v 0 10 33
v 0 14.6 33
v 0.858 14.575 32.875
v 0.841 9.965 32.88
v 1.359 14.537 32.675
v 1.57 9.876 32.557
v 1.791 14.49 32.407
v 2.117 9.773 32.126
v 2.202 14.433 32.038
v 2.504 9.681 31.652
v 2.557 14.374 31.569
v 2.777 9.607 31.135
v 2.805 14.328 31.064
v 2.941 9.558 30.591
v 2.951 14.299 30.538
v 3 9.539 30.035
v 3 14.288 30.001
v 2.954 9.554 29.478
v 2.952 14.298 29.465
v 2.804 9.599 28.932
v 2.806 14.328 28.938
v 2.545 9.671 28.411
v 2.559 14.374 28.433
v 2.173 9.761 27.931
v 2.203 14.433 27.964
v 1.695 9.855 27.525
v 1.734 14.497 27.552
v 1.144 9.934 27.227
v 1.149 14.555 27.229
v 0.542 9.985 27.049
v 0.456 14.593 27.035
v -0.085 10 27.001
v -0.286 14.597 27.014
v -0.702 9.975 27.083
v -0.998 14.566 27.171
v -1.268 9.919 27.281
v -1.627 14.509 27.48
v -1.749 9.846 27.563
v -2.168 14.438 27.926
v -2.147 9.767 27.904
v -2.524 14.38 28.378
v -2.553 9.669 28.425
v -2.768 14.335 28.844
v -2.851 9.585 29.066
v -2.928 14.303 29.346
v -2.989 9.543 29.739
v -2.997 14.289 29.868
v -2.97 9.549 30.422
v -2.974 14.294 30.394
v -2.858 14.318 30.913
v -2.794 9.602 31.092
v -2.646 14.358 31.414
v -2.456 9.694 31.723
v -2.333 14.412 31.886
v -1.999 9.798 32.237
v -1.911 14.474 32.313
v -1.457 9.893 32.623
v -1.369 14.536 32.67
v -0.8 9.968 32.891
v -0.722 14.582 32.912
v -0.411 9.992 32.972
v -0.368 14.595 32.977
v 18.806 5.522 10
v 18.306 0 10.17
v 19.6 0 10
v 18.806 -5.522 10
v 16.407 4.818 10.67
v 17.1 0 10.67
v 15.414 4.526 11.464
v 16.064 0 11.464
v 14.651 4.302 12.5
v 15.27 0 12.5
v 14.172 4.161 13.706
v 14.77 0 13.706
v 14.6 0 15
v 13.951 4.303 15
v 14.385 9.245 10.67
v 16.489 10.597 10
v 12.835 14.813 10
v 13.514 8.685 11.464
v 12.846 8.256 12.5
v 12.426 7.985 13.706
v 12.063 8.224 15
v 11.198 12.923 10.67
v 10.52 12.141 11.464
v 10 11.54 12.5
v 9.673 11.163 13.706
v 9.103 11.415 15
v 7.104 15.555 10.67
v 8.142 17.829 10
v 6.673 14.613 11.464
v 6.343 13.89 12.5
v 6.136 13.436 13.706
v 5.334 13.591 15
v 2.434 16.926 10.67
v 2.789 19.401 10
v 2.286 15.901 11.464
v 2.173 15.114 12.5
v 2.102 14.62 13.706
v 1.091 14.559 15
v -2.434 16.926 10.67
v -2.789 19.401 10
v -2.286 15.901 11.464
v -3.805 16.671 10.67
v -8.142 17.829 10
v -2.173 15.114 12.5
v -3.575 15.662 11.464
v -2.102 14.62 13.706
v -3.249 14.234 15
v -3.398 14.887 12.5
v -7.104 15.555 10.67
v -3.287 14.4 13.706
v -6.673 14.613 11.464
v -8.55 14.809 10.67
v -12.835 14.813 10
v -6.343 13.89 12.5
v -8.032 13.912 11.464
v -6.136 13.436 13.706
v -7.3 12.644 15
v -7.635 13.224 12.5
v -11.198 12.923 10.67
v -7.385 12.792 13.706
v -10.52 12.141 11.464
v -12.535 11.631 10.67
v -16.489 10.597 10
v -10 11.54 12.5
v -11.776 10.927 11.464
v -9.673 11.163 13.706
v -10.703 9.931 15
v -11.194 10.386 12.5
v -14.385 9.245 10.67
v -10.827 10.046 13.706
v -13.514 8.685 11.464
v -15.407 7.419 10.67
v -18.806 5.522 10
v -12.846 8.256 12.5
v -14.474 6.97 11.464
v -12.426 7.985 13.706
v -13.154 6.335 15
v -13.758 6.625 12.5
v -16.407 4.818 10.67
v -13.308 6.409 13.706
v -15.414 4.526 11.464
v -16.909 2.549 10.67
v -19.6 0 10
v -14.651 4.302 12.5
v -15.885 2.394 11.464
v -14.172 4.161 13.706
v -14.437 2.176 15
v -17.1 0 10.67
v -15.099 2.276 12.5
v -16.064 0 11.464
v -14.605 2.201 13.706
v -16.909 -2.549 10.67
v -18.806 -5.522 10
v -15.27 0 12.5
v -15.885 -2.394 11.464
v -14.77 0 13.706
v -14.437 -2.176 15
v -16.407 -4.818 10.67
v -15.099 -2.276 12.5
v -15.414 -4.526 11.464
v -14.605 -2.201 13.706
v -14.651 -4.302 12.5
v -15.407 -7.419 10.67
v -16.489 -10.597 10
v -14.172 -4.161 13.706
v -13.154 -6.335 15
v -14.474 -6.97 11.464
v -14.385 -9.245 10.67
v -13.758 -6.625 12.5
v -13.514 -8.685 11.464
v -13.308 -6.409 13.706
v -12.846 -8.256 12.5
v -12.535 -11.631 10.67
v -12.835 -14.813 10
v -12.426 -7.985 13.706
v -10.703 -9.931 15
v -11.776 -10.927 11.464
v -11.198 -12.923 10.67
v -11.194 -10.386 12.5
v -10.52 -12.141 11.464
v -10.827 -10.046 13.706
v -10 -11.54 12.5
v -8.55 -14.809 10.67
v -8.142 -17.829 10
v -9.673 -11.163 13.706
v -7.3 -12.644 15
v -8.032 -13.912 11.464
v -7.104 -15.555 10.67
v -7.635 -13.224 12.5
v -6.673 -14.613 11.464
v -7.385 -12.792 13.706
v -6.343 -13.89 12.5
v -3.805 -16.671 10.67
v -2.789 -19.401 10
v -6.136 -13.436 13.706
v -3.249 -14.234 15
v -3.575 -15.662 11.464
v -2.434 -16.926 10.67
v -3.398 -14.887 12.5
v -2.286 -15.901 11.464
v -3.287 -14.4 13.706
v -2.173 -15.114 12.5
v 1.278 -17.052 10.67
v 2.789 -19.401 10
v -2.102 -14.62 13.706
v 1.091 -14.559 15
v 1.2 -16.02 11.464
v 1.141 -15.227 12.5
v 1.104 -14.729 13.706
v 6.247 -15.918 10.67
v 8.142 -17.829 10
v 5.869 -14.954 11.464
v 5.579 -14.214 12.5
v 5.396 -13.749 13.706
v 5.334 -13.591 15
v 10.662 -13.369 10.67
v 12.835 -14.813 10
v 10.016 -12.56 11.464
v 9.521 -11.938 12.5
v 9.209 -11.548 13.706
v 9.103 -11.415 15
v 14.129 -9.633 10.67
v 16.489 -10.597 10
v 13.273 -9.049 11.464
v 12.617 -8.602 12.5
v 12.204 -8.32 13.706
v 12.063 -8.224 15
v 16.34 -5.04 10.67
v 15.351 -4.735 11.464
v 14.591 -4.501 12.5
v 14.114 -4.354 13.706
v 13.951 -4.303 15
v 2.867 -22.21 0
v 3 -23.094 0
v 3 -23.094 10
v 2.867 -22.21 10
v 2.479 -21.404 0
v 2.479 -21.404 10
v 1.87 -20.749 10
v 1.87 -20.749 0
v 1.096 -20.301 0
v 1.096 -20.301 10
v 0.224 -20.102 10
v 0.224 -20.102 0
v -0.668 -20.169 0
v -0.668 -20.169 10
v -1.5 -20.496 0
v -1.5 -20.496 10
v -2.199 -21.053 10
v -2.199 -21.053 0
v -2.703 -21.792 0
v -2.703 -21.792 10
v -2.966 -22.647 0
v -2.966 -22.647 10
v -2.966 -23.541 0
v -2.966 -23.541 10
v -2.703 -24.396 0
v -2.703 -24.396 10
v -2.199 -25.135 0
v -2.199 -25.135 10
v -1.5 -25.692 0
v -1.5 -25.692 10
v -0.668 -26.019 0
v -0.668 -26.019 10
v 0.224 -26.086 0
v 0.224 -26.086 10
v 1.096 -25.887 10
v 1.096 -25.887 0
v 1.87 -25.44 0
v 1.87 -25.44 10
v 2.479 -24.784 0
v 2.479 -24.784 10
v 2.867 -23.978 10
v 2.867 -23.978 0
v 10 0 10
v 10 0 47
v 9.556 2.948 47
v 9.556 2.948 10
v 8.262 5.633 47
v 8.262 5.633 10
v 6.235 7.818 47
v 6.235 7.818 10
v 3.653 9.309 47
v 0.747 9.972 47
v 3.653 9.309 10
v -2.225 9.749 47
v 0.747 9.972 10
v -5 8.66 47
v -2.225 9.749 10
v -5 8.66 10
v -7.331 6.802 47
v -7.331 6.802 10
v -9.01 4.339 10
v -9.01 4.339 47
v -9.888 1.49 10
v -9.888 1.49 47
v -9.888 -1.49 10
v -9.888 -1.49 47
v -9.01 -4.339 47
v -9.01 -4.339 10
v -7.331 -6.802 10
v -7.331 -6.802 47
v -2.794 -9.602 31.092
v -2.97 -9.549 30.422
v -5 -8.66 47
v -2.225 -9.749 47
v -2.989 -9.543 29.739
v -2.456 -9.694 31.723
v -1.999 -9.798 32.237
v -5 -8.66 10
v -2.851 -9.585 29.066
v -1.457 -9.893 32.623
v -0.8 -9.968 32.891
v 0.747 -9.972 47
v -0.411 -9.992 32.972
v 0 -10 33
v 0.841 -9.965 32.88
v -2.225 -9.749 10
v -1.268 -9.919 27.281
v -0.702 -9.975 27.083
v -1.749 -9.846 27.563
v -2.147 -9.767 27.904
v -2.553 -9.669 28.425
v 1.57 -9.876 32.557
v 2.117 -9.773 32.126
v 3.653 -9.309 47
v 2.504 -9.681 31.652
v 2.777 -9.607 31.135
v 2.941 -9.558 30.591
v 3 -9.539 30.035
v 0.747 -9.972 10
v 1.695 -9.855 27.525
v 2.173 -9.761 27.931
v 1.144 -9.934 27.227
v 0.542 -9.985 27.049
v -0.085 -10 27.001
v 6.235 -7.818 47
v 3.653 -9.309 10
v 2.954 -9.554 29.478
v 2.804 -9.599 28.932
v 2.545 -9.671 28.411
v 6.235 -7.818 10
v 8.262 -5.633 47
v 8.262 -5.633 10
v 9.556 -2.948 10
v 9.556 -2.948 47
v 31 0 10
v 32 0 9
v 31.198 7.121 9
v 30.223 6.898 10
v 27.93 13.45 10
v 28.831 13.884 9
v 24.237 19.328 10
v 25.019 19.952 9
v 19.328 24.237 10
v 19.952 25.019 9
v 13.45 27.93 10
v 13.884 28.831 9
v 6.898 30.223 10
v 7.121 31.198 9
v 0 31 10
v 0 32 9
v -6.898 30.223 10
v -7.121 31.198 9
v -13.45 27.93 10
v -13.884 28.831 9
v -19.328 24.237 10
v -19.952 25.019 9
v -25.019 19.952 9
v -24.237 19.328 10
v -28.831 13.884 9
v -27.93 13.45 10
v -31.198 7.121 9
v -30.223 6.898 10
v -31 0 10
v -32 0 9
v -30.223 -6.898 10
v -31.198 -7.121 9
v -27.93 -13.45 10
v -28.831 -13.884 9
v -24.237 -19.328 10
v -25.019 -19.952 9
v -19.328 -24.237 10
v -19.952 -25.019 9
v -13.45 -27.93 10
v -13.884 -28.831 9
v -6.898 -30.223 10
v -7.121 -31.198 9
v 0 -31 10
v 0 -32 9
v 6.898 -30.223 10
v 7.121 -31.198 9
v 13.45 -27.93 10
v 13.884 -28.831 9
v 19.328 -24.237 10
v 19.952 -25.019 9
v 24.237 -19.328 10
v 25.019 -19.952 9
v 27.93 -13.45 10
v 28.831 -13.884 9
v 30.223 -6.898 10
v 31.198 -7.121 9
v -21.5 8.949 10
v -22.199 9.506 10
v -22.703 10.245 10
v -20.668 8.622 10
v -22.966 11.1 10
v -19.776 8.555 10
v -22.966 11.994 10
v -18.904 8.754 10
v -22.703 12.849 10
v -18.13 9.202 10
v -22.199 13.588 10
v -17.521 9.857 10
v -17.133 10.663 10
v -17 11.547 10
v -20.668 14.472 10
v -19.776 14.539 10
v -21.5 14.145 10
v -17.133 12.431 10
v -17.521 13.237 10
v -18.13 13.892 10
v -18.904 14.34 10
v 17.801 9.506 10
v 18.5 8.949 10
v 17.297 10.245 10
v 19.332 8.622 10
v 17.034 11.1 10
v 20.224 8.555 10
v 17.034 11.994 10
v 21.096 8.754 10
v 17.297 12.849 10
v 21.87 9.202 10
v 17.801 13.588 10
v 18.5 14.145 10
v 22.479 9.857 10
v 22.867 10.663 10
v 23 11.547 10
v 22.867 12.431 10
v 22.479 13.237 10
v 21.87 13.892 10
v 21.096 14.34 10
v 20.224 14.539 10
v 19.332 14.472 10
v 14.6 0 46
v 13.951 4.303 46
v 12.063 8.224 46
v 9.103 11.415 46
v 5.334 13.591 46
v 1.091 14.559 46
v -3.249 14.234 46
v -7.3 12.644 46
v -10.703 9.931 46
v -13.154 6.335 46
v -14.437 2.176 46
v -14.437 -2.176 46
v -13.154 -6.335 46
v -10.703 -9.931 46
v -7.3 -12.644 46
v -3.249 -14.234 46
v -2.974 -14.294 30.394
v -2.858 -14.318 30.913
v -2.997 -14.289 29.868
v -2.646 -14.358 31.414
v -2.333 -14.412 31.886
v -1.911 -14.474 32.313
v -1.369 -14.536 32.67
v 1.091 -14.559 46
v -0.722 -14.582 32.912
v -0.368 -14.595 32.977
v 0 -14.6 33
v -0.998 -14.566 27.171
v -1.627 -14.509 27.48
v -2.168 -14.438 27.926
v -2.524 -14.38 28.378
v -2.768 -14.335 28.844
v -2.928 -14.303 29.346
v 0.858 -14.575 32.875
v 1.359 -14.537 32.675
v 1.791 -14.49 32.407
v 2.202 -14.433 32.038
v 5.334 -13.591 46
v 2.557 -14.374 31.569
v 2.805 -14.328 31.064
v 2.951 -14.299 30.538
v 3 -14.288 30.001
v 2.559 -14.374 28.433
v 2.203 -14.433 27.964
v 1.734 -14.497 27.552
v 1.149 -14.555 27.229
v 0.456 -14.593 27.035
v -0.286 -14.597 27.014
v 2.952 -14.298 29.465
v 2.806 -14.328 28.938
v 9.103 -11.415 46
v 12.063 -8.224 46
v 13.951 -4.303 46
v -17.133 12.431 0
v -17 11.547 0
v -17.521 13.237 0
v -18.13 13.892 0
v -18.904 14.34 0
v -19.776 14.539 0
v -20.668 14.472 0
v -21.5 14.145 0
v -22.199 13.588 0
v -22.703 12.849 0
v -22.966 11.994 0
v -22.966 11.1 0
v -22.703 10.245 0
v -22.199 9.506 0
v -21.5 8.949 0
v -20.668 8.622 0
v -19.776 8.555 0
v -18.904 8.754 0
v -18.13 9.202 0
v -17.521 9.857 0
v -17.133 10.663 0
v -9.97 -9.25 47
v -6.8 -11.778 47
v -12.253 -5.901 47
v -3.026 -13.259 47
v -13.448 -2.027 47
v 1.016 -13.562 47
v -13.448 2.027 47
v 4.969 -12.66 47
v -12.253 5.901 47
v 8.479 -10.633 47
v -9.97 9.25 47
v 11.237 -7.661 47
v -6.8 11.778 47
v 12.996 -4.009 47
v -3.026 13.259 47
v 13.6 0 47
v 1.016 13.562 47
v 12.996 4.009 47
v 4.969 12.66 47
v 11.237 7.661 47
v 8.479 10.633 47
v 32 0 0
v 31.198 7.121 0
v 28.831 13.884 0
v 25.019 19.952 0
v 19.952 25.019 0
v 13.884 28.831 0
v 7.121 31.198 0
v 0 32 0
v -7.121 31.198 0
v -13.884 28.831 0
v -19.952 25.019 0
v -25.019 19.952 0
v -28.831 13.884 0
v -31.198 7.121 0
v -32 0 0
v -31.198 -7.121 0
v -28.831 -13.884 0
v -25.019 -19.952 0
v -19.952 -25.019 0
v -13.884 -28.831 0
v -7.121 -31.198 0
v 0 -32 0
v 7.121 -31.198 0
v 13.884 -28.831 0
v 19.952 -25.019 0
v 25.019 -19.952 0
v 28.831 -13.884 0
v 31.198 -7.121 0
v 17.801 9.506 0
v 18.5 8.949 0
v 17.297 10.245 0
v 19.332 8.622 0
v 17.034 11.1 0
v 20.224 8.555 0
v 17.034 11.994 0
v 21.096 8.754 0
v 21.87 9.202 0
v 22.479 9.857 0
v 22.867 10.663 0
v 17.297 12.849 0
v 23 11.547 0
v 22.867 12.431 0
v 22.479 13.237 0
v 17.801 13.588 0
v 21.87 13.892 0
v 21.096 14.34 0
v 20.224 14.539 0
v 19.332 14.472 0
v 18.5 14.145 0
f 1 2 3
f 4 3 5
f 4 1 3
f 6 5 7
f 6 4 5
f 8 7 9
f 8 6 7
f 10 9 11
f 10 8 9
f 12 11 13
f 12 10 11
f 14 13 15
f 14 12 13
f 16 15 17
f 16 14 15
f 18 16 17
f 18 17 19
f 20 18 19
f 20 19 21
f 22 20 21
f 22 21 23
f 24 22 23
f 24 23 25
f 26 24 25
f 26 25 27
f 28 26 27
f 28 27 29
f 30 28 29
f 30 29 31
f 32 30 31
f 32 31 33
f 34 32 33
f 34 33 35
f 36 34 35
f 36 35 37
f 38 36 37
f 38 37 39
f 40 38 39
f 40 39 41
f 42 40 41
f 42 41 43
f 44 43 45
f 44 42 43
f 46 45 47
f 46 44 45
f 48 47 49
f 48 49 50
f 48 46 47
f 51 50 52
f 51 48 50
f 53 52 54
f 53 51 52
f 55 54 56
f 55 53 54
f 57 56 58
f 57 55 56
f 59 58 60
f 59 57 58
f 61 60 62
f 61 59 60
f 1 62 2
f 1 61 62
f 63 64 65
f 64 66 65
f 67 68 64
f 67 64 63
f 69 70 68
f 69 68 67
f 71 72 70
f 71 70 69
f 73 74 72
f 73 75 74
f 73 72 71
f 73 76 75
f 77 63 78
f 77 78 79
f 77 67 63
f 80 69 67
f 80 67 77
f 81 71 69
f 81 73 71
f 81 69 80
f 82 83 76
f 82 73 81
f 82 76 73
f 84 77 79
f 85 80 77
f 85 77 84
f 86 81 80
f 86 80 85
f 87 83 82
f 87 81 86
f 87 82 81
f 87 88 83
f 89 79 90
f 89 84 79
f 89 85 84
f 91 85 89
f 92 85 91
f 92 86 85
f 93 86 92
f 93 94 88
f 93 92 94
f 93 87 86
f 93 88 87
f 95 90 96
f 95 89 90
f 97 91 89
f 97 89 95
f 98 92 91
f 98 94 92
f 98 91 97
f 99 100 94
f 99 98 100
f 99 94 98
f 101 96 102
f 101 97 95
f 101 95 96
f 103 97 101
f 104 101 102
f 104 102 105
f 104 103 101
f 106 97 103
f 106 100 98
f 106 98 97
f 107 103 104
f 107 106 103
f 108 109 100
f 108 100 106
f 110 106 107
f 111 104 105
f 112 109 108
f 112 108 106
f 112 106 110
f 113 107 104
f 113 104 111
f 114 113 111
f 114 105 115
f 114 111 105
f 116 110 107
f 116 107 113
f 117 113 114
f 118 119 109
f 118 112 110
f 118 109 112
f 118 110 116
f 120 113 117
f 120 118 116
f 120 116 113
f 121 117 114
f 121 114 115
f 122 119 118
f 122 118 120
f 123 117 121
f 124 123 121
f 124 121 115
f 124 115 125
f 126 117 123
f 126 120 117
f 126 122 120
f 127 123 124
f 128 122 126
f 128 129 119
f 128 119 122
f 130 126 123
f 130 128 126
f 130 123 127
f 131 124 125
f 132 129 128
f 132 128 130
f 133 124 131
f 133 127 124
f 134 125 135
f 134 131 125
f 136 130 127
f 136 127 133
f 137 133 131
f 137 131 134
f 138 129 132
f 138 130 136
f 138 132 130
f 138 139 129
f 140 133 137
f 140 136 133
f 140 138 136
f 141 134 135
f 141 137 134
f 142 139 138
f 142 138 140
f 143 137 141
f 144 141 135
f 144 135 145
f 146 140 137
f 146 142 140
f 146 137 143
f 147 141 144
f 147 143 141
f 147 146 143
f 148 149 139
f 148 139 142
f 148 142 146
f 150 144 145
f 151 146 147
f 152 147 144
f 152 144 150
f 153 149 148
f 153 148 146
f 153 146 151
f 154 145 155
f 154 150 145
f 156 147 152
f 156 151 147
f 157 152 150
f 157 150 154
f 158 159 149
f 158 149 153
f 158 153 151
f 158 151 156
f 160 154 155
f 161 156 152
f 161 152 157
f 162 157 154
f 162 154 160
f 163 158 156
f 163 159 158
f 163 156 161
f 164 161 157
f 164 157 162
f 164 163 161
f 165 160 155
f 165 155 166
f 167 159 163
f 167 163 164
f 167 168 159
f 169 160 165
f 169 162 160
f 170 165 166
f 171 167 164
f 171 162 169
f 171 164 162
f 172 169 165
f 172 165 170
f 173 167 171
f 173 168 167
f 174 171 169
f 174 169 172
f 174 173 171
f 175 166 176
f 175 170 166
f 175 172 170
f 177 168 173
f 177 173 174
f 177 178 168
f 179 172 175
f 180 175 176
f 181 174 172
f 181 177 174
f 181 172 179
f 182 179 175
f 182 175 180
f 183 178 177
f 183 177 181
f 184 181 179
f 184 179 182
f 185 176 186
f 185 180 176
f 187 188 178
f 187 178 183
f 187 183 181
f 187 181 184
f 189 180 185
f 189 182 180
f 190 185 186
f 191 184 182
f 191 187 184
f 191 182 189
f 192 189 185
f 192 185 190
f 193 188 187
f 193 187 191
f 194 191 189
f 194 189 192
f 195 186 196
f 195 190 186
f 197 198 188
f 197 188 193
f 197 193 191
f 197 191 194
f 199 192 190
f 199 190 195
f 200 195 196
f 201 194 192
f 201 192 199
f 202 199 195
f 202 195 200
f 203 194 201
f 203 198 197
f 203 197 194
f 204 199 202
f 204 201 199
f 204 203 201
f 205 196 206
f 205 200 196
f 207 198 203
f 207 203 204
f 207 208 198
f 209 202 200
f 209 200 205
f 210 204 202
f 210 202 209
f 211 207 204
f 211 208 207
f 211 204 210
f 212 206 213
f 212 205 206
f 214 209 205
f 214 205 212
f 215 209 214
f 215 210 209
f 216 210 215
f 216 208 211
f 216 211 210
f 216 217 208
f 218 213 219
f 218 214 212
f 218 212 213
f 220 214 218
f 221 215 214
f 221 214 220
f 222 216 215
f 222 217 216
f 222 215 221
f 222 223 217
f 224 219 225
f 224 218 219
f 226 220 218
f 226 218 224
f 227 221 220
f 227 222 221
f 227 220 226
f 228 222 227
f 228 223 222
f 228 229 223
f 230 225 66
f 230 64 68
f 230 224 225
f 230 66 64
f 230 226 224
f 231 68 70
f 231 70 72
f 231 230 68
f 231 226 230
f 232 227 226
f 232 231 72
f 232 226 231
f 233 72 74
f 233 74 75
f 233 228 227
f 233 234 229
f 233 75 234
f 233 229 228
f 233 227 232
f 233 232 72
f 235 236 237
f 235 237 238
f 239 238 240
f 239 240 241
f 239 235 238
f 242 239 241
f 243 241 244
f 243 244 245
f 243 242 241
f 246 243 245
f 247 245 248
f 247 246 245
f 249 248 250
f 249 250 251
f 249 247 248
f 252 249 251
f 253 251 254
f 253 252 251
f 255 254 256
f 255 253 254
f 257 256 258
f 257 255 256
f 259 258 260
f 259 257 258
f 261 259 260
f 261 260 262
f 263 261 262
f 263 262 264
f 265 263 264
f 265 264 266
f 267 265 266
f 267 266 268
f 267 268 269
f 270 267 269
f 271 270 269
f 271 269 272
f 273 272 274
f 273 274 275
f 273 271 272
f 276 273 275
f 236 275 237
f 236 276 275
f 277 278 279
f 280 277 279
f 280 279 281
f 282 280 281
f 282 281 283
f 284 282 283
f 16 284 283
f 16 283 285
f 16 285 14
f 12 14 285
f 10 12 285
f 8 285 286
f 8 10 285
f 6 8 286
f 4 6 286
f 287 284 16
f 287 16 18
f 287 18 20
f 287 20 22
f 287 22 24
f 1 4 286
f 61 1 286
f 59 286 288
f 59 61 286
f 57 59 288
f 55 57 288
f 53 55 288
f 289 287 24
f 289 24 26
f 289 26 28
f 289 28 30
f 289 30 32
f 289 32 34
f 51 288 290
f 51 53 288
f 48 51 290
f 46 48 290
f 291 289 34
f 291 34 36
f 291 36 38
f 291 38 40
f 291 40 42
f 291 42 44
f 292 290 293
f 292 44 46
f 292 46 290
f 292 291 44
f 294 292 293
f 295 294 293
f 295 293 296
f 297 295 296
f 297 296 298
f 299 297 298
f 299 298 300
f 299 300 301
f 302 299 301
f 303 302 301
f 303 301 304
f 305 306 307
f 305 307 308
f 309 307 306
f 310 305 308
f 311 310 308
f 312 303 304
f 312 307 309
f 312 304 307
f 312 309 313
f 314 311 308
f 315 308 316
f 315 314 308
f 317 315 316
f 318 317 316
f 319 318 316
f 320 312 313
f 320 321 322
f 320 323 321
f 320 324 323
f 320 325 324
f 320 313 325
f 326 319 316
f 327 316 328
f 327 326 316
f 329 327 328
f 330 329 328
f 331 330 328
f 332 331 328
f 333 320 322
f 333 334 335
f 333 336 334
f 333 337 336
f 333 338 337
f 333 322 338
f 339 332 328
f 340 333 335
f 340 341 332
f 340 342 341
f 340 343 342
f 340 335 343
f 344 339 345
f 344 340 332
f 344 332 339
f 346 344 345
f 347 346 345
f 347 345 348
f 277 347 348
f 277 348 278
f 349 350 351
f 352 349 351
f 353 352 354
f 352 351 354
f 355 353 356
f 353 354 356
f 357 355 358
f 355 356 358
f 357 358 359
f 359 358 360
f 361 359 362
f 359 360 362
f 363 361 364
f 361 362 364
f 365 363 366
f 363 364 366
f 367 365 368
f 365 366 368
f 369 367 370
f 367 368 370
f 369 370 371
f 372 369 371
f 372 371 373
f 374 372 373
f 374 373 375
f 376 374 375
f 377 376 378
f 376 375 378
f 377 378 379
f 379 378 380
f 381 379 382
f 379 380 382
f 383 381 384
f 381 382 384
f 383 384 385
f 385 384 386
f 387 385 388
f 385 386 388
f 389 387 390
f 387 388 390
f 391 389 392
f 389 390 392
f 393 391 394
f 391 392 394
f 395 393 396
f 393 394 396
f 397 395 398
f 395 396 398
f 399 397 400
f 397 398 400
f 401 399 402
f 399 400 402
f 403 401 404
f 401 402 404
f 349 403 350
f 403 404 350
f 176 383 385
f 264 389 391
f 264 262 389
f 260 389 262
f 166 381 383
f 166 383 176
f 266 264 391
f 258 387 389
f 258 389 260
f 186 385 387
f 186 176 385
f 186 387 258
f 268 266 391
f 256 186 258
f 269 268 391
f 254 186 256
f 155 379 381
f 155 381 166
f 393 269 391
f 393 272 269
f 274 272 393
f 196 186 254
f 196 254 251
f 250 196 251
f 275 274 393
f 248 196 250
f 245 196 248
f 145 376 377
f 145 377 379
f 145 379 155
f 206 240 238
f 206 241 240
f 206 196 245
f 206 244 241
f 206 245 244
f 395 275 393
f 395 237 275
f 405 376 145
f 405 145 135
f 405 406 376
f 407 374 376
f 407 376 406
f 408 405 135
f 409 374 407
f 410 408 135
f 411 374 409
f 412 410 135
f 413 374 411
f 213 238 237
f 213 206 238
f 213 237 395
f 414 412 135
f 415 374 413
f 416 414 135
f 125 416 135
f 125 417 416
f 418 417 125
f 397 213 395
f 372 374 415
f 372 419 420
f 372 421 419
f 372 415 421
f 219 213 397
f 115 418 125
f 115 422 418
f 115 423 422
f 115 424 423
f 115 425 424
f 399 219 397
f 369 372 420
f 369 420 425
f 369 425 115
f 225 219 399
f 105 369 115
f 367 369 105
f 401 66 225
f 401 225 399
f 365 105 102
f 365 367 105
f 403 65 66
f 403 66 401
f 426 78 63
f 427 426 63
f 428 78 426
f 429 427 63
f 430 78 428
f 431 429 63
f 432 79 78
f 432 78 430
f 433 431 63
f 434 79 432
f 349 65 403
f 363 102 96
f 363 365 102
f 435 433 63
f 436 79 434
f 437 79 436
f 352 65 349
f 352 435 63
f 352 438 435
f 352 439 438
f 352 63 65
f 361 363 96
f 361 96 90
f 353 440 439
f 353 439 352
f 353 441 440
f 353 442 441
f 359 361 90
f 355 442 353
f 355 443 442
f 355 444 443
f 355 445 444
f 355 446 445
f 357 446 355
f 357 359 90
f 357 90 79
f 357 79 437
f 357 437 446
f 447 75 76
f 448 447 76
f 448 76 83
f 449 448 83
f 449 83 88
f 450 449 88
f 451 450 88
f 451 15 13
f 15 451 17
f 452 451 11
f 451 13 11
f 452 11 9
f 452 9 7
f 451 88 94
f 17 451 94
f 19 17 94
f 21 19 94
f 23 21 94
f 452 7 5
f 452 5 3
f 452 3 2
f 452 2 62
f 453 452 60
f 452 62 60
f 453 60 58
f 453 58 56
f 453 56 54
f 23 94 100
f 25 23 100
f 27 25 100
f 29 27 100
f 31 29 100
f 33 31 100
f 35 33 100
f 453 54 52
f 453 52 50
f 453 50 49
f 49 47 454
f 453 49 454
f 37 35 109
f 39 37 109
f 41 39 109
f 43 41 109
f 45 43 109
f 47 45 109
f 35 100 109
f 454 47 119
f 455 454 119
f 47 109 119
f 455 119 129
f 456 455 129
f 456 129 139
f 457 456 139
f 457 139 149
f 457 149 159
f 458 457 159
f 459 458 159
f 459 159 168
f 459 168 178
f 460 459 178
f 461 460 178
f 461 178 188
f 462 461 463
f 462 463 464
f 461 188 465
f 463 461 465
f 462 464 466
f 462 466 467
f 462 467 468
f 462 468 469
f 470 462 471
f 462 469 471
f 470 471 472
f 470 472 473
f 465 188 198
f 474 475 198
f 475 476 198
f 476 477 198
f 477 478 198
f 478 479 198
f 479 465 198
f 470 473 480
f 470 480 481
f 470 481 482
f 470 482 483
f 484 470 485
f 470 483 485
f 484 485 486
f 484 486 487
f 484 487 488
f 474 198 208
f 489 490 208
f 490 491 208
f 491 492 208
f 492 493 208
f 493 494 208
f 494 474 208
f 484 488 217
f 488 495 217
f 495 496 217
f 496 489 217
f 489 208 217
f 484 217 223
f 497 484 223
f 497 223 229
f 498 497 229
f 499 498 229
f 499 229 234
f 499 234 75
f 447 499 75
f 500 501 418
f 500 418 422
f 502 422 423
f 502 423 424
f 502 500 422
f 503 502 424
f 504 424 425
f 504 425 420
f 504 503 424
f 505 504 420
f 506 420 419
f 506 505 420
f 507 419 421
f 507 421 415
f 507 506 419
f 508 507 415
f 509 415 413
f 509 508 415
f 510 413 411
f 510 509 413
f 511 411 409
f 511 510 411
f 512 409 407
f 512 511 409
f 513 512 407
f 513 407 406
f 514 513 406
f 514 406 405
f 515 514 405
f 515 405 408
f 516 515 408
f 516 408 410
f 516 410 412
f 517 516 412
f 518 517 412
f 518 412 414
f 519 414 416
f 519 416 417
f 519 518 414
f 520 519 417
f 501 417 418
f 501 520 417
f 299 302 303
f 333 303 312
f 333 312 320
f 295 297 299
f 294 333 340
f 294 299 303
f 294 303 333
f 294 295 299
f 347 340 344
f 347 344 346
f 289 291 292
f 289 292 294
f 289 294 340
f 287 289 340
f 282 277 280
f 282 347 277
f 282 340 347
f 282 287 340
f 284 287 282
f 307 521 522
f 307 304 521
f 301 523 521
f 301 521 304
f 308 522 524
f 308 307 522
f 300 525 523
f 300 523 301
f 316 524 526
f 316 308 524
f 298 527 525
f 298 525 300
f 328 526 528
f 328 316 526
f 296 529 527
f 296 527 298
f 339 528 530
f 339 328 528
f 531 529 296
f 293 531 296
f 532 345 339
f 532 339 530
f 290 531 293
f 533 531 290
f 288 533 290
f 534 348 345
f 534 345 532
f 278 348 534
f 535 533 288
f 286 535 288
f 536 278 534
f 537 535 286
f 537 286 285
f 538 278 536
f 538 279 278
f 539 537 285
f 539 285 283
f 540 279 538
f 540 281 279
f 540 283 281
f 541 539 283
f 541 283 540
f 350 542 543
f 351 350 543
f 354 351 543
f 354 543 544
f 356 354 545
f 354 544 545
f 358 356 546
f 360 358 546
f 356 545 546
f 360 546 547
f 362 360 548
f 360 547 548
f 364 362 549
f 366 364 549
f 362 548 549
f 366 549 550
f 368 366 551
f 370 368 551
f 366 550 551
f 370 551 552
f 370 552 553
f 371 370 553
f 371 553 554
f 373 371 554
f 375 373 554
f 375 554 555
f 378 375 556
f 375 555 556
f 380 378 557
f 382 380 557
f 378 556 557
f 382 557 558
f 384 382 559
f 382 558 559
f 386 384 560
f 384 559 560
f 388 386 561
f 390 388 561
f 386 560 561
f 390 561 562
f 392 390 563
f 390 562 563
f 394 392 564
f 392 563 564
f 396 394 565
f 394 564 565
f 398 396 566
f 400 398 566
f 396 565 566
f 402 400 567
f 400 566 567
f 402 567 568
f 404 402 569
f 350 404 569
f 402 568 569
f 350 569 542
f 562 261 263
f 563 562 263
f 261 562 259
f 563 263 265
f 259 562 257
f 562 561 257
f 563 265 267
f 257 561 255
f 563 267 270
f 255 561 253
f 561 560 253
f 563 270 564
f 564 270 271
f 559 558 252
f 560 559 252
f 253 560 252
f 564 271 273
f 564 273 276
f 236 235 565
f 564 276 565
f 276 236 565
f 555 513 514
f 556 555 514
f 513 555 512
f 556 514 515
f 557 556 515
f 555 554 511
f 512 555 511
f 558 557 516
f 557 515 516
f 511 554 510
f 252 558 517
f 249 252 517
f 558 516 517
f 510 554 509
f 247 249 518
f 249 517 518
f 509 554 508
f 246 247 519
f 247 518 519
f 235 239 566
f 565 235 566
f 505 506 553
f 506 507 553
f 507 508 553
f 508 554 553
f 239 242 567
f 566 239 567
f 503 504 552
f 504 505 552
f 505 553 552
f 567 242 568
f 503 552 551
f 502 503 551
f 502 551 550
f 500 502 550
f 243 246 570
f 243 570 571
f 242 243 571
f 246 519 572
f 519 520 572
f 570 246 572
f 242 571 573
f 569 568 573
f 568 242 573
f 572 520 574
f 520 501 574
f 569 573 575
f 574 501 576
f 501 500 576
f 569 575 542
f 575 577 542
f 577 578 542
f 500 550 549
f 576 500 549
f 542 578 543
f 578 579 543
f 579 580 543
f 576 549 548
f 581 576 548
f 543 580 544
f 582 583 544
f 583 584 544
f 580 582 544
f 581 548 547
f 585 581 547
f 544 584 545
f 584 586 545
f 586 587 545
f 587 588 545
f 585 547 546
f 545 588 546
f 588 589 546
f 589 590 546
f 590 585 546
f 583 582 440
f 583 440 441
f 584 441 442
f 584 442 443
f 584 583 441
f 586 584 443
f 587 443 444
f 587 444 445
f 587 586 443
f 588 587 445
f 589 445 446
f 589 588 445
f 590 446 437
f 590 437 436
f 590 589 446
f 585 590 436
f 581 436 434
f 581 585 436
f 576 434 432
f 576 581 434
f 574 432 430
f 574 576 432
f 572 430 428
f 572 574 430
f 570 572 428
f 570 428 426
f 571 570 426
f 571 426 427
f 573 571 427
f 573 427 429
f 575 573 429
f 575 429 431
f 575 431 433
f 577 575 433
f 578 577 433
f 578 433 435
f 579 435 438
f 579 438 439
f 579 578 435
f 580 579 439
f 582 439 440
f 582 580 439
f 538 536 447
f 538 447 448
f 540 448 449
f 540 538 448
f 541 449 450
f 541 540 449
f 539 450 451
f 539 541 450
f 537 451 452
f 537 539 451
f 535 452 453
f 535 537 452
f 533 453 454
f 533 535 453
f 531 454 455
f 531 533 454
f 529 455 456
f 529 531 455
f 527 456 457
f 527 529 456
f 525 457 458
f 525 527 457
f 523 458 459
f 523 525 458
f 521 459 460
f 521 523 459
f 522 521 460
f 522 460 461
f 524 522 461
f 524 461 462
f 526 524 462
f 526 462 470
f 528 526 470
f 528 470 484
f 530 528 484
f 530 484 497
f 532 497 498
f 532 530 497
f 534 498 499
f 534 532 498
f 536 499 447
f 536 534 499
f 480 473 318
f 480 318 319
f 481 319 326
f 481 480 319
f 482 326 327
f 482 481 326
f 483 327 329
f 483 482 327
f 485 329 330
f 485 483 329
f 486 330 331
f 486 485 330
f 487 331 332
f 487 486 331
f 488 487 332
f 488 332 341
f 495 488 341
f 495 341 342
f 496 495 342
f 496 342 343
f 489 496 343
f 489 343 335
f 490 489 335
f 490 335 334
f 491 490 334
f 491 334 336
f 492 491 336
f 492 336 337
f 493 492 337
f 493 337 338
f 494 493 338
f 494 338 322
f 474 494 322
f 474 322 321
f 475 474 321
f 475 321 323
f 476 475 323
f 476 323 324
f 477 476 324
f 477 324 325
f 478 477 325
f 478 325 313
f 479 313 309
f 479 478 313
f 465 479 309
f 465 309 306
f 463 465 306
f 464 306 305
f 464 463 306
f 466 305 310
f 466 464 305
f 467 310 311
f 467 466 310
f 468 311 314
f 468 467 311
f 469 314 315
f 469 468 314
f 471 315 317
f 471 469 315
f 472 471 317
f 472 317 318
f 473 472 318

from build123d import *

# Parameters (mm, degrees)
SKETCH1_R               = 32
SKETCH1_R_2             = 3
BOSS_EXTRUDE1_DEPTH     = 10
SKETCH2_R               = 14.6
SKETCH2_R_2             = 10
BOSS_EXTRUDE2_DEPTH     = 37
CUT_EXTRUDE1_DEPTH      = 66.245689513
CUT_EXTRUDE1_DEPTH_BACK = 66.245689513
SKETCH3_R               = 3
FILLET_1_R              = 5
CHAMFER_1_SIZE          = 1


with BuildPart() as part:
    # Sketch1 → Boss-Extrude1 (new body)
    with BuildSketch(Plane.XY):
        Circle(SKETCH1_R)
        with Locations((20, 11.547005384)):
            Circle(SKETCH1_R_2, mode=Mode.SUBTRACT)
        with Locations((0, -23.094010768)):
            Circle(SKETCH1_R_2, mode=Mode.SUBTRACT)
        with Locations((-20, 11.547005384)):
            Circle(SKETCH1_R_2, mode=Mode.SUBTRACT)
    extrude(amount=BOSS_EXTRUDE1_DEPTH)

    # Sketch2 → Boss-Extrude2 (add)
    with BuildSketch(Plane.XY.offset(10)):
        Circle(SKETCH2_R)
        Circle(SKETCH2_R_2, mode=Mode.SUBTRACT)
    extrude(amount=BOSS_EXTRUDE2_DEPTH)

    # Sketch3 → Cut-Extrude1 (cut, two sides: drawn at the far end of the back side and taken through both)
    with BuildSketch(Plane(origin=(0, 0, 0), x_dir=(1, 0, 0), z_dir=(0, 1, 0)).offset(-CUT_EXTRUDE1_DEPTH_BACK)):
        with Locations(Location((0, -30, 0), (0, 0, 270))):
            Circle(SKETCH3_R)
    extrude(amount=CUT_EXTRUDE1_DEPTH + CUT_EXTRUDE1_DEPTH_BACK, mode=Mode.SUBTRACT)

    # 圆角1
    fillet_1_edges = [part.edges().sort_by_distance(p)[0] for p in [
        (-14.6, 0, 10),
    ]]
    fillet(fillet_1_edges, radius=FILLET_1_R)

    # 倒角1
    chamfer_1_edges = [part.edges().sort_by_distance(p)[0] for p in [
        (-14.6, 0, 47),
        (-32, 0, 10),
    ]]
    chamfer(chamfer_1_edges, length=CHAMFER_1_SIZE)


solid = part.part
